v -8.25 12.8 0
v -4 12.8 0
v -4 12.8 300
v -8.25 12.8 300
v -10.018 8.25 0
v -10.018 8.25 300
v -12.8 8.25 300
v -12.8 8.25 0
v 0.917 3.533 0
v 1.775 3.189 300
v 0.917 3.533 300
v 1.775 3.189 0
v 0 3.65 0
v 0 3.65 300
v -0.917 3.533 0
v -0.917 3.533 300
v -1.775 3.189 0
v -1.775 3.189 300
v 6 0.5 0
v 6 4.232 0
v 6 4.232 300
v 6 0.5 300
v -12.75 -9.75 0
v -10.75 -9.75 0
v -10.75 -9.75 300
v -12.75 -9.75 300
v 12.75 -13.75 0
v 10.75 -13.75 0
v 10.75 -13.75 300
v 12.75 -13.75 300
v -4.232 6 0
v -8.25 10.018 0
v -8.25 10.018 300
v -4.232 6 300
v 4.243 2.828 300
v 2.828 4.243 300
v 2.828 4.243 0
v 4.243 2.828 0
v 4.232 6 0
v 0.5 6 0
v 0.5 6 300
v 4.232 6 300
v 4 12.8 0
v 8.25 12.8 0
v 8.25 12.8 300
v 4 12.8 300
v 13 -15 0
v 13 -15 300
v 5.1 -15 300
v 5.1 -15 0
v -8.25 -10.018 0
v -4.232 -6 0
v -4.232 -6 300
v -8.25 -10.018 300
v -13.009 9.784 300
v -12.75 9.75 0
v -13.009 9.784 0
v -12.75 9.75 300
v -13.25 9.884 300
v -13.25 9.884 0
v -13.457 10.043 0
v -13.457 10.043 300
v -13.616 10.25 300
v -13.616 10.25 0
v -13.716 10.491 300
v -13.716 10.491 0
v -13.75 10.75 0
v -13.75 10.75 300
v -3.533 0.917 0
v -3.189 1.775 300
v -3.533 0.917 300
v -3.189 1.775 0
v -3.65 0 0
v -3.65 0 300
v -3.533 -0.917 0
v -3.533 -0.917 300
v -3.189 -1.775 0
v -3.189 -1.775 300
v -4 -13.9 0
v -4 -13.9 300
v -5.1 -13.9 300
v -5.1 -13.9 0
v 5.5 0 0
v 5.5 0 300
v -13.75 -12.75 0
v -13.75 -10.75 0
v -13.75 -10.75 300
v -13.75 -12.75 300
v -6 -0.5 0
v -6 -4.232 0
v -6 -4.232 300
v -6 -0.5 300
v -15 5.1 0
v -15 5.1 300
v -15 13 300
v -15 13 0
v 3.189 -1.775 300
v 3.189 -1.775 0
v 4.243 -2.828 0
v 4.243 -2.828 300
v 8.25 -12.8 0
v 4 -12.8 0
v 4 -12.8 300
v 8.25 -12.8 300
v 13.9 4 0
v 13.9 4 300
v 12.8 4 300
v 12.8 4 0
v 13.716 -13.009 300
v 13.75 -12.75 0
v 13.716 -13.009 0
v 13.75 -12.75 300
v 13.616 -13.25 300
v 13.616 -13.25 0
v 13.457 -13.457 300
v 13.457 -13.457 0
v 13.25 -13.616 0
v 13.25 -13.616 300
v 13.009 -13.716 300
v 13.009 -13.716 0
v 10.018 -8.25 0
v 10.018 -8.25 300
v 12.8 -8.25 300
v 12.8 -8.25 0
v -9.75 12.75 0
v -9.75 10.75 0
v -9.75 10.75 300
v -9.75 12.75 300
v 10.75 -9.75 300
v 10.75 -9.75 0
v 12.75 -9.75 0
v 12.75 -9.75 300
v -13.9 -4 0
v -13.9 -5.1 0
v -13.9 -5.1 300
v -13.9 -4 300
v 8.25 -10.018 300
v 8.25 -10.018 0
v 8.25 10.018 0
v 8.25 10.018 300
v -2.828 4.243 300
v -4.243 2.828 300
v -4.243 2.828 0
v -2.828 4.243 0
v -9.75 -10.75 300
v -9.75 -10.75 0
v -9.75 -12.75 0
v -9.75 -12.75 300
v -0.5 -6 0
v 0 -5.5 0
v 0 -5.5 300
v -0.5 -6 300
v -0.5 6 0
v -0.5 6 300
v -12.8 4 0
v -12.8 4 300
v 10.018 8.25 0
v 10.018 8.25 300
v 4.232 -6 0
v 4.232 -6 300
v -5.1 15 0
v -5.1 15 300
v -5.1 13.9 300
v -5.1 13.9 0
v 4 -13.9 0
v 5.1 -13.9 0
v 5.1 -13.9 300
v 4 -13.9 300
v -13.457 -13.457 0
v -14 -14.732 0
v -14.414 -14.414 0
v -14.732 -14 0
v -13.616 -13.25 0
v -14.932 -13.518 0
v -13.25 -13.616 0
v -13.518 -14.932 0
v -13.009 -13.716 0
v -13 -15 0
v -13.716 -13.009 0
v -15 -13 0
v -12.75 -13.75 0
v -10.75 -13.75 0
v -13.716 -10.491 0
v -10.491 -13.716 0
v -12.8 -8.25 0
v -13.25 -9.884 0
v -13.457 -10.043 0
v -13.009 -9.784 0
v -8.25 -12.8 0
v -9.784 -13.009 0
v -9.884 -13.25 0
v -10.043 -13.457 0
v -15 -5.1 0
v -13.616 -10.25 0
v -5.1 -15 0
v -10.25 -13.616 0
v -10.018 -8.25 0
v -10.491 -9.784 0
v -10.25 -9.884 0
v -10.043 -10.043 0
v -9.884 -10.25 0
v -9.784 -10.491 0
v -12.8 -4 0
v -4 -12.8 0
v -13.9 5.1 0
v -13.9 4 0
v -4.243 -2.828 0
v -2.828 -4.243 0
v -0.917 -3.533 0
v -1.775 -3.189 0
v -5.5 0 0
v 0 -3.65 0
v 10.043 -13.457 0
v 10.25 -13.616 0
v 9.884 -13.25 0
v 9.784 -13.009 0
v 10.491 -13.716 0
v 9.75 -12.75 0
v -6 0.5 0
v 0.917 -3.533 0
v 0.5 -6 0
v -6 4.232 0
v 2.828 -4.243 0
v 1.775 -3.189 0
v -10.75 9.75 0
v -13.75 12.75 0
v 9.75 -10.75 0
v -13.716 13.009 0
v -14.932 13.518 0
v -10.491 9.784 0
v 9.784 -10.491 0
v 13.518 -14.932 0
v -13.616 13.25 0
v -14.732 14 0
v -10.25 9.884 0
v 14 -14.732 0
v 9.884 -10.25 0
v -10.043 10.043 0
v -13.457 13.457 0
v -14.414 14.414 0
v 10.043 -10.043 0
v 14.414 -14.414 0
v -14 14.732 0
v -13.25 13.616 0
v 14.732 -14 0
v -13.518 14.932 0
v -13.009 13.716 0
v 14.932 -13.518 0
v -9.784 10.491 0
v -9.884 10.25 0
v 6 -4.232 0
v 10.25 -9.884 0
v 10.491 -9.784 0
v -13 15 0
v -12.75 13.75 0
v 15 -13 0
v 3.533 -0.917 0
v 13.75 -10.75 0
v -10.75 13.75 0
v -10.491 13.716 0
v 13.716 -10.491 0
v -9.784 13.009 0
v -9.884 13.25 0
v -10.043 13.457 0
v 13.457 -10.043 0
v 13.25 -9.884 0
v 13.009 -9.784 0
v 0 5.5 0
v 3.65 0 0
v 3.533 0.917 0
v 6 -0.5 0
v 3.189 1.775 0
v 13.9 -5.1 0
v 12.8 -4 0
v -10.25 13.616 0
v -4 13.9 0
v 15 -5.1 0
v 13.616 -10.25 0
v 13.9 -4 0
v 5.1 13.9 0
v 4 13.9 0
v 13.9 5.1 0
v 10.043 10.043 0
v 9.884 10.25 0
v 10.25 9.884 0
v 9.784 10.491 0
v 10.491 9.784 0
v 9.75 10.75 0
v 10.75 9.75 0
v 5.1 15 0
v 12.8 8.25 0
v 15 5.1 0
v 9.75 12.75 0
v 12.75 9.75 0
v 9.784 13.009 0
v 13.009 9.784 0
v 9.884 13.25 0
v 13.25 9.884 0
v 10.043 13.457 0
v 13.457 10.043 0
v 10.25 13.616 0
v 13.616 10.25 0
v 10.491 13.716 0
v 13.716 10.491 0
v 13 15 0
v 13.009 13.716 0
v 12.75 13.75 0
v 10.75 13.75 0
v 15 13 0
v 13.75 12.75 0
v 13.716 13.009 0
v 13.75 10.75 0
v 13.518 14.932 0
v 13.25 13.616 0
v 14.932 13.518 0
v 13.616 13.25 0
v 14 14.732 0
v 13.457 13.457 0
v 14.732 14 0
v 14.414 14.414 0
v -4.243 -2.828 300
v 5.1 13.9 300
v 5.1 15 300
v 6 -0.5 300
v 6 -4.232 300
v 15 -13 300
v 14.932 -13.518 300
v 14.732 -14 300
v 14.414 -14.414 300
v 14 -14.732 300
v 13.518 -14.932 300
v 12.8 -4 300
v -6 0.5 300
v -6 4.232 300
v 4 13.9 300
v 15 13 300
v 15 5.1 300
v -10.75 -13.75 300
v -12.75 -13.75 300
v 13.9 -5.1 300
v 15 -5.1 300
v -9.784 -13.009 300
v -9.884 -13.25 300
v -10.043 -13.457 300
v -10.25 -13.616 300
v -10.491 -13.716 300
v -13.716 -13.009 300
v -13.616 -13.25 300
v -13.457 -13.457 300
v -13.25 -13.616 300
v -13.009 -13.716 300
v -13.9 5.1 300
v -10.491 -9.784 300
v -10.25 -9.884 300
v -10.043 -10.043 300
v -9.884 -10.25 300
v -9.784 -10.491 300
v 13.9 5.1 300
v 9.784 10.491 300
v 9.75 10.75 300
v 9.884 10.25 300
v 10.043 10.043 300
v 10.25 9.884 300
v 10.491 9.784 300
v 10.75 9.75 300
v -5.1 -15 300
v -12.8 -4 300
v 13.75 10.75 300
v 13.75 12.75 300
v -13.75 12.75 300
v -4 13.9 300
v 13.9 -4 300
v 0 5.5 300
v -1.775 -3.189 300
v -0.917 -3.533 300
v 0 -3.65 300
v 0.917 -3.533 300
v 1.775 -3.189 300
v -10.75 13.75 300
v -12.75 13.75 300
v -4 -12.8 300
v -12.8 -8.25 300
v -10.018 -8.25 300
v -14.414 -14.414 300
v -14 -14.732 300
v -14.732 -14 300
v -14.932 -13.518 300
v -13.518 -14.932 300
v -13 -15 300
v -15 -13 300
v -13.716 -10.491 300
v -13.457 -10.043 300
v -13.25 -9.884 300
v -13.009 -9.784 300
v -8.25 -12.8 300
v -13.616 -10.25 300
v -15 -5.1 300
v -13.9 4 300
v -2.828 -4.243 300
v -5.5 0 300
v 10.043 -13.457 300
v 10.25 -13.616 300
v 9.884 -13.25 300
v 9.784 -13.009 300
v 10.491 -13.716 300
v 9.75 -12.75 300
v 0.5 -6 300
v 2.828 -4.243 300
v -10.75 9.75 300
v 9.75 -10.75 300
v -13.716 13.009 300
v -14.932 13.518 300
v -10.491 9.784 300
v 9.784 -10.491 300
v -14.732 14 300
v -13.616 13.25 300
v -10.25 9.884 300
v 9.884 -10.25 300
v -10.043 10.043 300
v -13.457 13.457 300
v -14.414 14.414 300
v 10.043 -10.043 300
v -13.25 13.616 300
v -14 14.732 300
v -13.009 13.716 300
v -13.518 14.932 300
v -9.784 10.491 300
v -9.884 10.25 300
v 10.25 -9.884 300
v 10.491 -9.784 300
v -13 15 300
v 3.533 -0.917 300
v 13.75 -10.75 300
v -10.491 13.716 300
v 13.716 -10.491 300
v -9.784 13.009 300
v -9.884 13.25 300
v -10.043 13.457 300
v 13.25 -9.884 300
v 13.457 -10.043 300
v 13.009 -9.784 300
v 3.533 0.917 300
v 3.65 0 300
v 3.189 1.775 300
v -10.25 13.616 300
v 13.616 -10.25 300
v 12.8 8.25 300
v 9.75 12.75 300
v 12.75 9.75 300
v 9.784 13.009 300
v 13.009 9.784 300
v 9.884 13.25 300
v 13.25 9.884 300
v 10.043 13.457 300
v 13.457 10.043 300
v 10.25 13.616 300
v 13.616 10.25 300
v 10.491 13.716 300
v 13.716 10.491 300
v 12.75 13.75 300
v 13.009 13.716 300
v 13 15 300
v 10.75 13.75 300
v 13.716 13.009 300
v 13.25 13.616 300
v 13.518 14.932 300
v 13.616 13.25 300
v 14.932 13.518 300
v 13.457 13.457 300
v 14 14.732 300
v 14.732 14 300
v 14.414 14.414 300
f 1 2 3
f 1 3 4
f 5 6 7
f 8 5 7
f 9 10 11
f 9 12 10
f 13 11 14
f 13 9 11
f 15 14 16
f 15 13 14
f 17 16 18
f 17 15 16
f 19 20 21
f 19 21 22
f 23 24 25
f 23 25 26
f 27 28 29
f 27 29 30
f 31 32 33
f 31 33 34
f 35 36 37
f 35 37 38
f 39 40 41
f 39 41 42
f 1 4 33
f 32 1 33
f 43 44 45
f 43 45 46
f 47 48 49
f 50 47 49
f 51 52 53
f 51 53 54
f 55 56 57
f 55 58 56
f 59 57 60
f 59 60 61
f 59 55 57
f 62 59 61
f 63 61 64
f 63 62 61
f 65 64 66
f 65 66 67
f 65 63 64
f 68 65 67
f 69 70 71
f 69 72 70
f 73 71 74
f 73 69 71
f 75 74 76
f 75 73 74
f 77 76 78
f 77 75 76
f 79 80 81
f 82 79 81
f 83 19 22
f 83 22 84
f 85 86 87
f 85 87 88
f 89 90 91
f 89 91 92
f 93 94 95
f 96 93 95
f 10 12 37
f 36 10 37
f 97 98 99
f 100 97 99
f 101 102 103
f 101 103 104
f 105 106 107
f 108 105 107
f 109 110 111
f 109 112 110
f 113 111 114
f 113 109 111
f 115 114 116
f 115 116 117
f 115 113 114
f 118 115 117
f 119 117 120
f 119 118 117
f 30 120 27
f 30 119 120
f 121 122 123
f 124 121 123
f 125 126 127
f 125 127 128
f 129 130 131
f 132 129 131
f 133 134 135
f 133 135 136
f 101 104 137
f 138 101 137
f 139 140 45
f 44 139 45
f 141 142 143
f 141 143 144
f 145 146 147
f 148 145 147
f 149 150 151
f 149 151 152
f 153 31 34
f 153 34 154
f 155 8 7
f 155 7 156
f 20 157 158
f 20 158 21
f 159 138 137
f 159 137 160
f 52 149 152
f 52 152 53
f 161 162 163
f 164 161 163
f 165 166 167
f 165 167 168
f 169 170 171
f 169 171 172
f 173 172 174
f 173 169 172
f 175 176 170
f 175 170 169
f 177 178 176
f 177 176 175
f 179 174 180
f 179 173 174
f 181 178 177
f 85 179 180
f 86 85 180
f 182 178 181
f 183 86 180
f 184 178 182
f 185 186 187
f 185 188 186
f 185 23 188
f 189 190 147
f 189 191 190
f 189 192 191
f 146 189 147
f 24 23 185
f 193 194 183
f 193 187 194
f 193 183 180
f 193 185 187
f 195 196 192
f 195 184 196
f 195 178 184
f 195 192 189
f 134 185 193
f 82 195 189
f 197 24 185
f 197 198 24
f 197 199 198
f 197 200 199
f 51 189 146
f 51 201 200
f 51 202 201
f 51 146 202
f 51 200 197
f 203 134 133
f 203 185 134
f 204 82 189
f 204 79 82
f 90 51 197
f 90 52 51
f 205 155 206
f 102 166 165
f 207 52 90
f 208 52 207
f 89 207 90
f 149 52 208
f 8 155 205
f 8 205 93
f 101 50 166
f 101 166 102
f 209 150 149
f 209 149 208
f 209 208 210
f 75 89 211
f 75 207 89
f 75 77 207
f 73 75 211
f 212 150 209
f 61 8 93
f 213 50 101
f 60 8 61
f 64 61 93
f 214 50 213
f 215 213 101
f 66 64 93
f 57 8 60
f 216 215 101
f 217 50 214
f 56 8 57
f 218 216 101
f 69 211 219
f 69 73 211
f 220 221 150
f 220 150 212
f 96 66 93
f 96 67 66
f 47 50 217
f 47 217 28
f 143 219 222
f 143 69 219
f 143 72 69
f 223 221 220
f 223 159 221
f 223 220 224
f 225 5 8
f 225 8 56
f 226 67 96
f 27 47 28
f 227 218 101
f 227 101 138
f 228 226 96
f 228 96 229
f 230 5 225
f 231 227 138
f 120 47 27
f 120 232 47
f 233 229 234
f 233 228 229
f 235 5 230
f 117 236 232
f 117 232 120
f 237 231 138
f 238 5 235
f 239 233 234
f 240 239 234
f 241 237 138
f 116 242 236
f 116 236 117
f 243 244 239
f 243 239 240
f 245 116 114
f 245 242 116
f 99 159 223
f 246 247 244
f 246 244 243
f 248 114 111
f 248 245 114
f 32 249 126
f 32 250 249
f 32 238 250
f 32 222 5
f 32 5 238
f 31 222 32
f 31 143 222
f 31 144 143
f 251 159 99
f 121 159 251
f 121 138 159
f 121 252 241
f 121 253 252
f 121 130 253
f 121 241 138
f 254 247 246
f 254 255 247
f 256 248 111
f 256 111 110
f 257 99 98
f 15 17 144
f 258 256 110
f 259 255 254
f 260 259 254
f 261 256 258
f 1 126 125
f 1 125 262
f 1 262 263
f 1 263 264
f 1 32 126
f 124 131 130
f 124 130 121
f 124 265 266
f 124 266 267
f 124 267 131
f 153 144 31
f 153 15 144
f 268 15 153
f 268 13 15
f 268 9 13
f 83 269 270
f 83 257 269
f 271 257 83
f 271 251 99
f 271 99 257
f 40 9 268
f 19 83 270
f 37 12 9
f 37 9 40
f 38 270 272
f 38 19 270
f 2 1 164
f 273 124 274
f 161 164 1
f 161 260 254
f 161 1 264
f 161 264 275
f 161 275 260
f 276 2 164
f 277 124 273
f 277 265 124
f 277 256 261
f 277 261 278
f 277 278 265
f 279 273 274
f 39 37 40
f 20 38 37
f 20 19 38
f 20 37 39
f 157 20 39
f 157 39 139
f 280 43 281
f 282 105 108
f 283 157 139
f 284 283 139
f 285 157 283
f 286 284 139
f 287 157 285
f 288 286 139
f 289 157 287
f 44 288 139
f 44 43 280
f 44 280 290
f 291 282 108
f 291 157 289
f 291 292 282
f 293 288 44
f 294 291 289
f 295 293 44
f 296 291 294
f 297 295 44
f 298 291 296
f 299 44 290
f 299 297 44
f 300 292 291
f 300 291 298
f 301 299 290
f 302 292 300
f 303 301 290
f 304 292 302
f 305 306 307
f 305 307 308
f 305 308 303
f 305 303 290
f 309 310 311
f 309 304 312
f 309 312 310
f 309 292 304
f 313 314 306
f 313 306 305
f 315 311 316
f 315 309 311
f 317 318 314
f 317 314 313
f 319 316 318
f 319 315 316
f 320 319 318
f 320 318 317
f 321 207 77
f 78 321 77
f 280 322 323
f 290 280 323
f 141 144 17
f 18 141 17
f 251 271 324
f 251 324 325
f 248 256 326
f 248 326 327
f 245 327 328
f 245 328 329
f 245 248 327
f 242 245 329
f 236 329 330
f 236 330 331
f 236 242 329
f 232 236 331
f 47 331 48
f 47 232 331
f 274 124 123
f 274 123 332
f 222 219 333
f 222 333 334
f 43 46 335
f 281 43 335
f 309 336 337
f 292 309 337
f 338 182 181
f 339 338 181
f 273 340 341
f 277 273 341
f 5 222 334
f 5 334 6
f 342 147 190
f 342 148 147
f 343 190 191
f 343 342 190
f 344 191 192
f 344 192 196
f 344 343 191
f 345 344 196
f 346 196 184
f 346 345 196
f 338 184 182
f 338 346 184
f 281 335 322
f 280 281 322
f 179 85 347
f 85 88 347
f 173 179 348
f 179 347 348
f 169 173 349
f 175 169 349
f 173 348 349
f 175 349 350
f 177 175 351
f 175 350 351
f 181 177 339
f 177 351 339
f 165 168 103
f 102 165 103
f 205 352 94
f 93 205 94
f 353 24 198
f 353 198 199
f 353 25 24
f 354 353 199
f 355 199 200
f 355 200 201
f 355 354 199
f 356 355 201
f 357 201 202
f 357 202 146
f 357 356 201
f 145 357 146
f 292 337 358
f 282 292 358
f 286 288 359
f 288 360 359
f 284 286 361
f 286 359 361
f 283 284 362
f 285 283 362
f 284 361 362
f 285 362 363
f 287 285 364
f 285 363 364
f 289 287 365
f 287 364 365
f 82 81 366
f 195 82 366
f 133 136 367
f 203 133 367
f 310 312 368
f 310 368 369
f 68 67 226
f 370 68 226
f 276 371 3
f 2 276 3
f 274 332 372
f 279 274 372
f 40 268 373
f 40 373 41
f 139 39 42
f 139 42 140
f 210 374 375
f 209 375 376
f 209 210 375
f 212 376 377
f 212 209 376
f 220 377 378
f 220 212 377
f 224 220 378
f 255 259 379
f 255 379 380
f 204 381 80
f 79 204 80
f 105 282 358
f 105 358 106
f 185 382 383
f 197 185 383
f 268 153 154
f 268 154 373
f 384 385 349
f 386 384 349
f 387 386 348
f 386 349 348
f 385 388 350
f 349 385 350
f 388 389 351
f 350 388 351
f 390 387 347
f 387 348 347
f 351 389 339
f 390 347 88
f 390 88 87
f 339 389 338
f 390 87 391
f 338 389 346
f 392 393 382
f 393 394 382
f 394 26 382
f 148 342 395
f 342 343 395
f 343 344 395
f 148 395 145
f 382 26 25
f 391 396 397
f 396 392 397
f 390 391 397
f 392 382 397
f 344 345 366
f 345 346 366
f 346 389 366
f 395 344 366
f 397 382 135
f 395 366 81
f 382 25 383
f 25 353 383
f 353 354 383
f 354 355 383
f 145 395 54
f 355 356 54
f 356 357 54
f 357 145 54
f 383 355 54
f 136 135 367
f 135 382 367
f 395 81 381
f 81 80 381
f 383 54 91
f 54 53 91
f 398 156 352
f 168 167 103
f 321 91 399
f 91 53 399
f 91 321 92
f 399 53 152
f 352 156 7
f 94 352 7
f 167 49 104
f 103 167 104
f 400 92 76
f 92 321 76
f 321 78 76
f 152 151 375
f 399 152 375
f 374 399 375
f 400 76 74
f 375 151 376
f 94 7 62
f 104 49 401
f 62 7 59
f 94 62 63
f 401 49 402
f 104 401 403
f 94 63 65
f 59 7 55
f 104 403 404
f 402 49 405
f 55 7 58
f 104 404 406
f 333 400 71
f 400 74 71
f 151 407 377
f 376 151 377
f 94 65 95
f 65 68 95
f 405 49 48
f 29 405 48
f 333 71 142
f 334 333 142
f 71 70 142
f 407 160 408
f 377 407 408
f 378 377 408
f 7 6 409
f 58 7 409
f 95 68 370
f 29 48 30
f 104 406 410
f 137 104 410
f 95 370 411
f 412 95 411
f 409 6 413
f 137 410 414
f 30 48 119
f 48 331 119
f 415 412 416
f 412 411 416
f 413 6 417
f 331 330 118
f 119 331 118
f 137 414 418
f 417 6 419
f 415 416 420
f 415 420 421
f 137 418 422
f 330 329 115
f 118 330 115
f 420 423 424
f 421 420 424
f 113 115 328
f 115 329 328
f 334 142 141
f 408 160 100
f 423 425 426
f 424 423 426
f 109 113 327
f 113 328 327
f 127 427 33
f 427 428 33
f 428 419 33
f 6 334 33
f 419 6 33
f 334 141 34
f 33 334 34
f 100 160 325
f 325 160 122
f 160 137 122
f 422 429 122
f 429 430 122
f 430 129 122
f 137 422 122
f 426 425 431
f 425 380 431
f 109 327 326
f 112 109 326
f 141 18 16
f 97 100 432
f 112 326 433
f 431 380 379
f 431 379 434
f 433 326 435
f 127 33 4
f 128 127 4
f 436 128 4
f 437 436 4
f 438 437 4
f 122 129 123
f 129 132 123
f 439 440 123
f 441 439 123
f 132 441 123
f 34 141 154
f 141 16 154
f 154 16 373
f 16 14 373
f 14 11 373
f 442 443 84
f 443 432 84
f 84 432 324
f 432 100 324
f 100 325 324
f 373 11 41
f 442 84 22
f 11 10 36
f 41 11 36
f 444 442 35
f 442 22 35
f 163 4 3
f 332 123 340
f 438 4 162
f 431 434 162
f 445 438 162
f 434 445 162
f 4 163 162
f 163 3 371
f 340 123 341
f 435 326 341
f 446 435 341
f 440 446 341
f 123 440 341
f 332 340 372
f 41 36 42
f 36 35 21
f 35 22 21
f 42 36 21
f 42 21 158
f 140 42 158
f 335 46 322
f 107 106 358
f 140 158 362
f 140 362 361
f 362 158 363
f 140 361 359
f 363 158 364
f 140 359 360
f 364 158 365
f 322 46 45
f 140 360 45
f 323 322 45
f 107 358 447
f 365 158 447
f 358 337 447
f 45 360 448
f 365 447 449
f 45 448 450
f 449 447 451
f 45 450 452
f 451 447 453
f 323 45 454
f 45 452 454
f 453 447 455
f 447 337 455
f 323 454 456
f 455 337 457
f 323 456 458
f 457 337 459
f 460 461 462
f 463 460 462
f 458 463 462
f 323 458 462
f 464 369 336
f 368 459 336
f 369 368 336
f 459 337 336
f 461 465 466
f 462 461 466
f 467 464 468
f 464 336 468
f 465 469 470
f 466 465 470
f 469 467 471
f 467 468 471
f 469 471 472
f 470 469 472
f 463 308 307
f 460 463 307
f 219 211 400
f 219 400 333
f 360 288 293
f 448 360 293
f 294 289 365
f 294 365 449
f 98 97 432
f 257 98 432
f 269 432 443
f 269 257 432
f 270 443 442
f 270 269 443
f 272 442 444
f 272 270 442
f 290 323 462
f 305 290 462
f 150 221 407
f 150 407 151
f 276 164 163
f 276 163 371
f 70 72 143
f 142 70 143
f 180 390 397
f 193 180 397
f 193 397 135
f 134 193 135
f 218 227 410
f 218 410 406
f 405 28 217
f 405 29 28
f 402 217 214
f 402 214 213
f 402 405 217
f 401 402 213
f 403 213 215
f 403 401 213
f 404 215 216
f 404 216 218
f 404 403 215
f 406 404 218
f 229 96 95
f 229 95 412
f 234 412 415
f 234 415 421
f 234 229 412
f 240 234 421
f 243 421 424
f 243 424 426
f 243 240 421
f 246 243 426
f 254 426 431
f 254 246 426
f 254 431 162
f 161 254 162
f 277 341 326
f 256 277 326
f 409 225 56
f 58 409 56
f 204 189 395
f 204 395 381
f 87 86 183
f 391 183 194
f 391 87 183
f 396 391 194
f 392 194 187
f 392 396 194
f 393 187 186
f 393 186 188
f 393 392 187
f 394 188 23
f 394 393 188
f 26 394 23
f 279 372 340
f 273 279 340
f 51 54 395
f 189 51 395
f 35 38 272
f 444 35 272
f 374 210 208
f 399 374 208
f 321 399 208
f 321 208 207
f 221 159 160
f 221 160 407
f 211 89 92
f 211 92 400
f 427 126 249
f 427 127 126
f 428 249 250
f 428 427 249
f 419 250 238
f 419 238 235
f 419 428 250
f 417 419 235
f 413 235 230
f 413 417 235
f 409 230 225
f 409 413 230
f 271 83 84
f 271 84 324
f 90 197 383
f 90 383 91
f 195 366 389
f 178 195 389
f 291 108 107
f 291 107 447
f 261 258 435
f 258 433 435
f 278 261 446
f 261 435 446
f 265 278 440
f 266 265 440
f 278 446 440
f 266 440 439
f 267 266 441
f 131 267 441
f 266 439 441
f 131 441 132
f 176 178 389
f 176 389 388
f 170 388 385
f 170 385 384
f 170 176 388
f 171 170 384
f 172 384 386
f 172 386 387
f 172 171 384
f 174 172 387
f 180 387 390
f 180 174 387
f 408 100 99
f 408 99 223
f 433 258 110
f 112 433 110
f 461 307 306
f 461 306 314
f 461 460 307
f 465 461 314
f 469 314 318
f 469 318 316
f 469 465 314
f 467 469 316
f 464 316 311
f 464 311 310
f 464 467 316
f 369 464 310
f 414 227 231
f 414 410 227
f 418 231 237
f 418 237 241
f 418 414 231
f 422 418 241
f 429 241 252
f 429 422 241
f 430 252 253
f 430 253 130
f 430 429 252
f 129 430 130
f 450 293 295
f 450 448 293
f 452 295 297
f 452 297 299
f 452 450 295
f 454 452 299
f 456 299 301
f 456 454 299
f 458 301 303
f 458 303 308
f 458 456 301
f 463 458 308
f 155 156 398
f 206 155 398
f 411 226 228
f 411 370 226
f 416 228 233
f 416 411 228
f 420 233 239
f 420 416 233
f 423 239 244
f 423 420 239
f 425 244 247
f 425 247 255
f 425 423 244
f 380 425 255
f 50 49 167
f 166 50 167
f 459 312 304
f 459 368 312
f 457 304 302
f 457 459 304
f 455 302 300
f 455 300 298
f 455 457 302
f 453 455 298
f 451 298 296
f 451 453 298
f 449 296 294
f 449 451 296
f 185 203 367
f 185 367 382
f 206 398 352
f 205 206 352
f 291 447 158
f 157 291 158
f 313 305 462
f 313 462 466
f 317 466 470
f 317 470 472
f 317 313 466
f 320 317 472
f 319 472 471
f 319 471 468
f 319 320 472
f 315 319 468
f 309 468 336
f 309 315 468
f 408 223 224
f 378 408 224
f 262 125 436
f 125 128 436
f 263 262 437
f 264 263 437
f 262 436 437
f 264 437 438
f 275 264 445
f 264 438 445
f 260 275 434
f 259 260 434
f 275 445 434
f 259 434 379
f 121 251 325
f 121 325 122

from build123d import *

# Parameters (mm, degrees)
SKETCH1_R                = 3.65
SKETCH1_W                = 4
SKETCH1_H                = 4
BOSS_EXTRUDE1_DEPTH      = 300
FILLET1_R                = 1
CIRPATTERN1_COUNT        = 4
FILLET1_OF_CIRPATTERN1_R = 1
CUT_EXTRUDE1_DEPTH       = 301.749064836
CUT_EXTRUDE2_DEPTH       = 301.749064836
CIRPATTERN2_COUNT        = 4


with BuildPart() as part:
    # Sketch1 → Boss-Extrude1 (new body)
    with BuildSketch(Plane.XY):
        with BuildLine():
            Line((5.1, 15), (13, 15))
            ThreePointArc((13, 15), (14.414213562, 14.414213562), (15, 13))
            Line((15, 13), (15, 5.1))
            Line((15, 5.1), (13.9, 5.1))
            Line((13.9, 5.1), (13.9, 4))
            Line((13.9, 4), (12.8, 4))
            Line((12.8, 4), (12.8, 8.25))
            Line((12.8, 8.25), (10.017766953, 8.25))
            Line((10.017766953, 8.25), (6, 4.232233047))
            Line((6, 4.232233047), (6, -6))
            Line((6, -6), (-6, -6))
            Line((-6, -6), (-6, 6))
            Line((-6, 6), (4.232233047, 6))
            Line((4.232233047, 6), (8.25, 10.017766953))
            Line((8.25, 10.017766953), (8.25, 12.8))
            Line((8.25, 12.8), (4, 12.8))
            Line((4, 12.8), (4, 13.9))
            Line((4, 13.9), (5.1, 13.9))
            Line((5.1, 13.9), (5.1, 15))
        make_face()
        Circle(SKETCH1_R, mode=Mode.SUBTRACT)
        with Locations((11.75, 11.75)):
            Rectangle(SKETCH1_W, SKETCH1_H, mode=Mode.SUBTRACT)
    boss_extrude1 = extrude(amount=BOSS_EXTRUDE1_DEPTH)

    # Fillet1
    fillet1_edges = [part.edges().sort_by_distance(p)[0] for p in [
        (9.75, 13.75, 150),
        (9.75, 9.75, 150),
        (13.75, 9.75, 150),
        (13.75, 13.75, 150),
    ]]
    fillet(fillet1_edges, radius=FILLET1_R)

    # CirPattern1: Boss-Extrude1 ×4 about axis
    cirpattern1_axis = Axis((0, 0, 0), (0, 0, 1))
    for i in range(1, CIRPATTERN1_COUNT):
        add(boss_extrude1.rotate(cirpattern1_axis, i * 360 / CIRPATTERN1_COUNT))

    # Fillet1 of CirPattern1
    fillet1_of_cirpattern1_edges = [part.edges().sort_by_distance(p)[0] for p in [
        (-13.75, 9.75, 150),
        (-9.75, 9.75, 150),
        (-9.75, 13.75, 150),
        (-13.75, 13.75, 150),
        (-9.75, -13.75, 150),
        (-9.75, -9.75, 150),
        (-13.75, -9.75, 150),
        (-13.75, -13.75, 150),
        (13.75, -9.75, 150),
        (9.75, -9.75, 150),
        (9.75, -13.75, 150),
        (13.75, -13.75, 150),
    ]]
    fillet(fillet1_of_cirpattern1_edges, radius=FILLET1_OF_CIRPATTERN1_R)

    # Sketch2 → Cut-Extrude1 (cut, through all)
    with BuildSketch(Plane(origin=(0, 0, 0), x_dir=(-1, 0, 0), z_dir=(0, 0, -1))):
        Polygon((0, 5.5), (-0.5, 6), (0.5, 6), align=None)
    cut_extrude1 = extrude(amount=-CUT_EXTRUDE1_DEPTH, mode=Mode.SUBTRACT)

    # Sketch3 → Cut-Extrude2 (cut, through all)
    with BuildSketch(Plane(origin=(0, 0, 0), x_dir=(-1, 0, 0), z_dir=(0, 0, -1))):
        with BuildLine():
            Line((-1.775079755, 3.189293317), (-2.828427125, 4.242640687))
            Line((-2.828427125, 4.242640687), (-4.242640687, 2.828427125))
            Line((-4.242640687, 2.828427125), (-3.189293317, 1.775079755))
            ThreePointArc((-3.189293317, 1.775079755), (-2.580939751, 2.580939751), (-1.775079755, 3.189293317))
        make_face()
    cut_extrude2 = extrude(amount=-CUT_EXTRUDE2_DEPTH, mode=Mode.SUBTRACT)

    # CirPattern2: Cut-Extrude1, Cut-Extrude2 ×4 about axis
    cirpattern2_axis = Axis((0, 0, 0), (0, 0, 1))
    add([cut_extrude1.rotate(cirpattern2_axis, i * 360 / CIRPATTERN2_COUNT) for i in range(1, CIRPATTERN2_COUNT)], mode=Mode.SUBTRACT)
    add([cut_extrude2.rotate(cirpattern2_axis, i * 360 / CIRPATTERN2_COUNT) for i in range(1, CIRPATTERN2_COUNT)], mode=Mode.SUBTRACT)


solid = part.part
